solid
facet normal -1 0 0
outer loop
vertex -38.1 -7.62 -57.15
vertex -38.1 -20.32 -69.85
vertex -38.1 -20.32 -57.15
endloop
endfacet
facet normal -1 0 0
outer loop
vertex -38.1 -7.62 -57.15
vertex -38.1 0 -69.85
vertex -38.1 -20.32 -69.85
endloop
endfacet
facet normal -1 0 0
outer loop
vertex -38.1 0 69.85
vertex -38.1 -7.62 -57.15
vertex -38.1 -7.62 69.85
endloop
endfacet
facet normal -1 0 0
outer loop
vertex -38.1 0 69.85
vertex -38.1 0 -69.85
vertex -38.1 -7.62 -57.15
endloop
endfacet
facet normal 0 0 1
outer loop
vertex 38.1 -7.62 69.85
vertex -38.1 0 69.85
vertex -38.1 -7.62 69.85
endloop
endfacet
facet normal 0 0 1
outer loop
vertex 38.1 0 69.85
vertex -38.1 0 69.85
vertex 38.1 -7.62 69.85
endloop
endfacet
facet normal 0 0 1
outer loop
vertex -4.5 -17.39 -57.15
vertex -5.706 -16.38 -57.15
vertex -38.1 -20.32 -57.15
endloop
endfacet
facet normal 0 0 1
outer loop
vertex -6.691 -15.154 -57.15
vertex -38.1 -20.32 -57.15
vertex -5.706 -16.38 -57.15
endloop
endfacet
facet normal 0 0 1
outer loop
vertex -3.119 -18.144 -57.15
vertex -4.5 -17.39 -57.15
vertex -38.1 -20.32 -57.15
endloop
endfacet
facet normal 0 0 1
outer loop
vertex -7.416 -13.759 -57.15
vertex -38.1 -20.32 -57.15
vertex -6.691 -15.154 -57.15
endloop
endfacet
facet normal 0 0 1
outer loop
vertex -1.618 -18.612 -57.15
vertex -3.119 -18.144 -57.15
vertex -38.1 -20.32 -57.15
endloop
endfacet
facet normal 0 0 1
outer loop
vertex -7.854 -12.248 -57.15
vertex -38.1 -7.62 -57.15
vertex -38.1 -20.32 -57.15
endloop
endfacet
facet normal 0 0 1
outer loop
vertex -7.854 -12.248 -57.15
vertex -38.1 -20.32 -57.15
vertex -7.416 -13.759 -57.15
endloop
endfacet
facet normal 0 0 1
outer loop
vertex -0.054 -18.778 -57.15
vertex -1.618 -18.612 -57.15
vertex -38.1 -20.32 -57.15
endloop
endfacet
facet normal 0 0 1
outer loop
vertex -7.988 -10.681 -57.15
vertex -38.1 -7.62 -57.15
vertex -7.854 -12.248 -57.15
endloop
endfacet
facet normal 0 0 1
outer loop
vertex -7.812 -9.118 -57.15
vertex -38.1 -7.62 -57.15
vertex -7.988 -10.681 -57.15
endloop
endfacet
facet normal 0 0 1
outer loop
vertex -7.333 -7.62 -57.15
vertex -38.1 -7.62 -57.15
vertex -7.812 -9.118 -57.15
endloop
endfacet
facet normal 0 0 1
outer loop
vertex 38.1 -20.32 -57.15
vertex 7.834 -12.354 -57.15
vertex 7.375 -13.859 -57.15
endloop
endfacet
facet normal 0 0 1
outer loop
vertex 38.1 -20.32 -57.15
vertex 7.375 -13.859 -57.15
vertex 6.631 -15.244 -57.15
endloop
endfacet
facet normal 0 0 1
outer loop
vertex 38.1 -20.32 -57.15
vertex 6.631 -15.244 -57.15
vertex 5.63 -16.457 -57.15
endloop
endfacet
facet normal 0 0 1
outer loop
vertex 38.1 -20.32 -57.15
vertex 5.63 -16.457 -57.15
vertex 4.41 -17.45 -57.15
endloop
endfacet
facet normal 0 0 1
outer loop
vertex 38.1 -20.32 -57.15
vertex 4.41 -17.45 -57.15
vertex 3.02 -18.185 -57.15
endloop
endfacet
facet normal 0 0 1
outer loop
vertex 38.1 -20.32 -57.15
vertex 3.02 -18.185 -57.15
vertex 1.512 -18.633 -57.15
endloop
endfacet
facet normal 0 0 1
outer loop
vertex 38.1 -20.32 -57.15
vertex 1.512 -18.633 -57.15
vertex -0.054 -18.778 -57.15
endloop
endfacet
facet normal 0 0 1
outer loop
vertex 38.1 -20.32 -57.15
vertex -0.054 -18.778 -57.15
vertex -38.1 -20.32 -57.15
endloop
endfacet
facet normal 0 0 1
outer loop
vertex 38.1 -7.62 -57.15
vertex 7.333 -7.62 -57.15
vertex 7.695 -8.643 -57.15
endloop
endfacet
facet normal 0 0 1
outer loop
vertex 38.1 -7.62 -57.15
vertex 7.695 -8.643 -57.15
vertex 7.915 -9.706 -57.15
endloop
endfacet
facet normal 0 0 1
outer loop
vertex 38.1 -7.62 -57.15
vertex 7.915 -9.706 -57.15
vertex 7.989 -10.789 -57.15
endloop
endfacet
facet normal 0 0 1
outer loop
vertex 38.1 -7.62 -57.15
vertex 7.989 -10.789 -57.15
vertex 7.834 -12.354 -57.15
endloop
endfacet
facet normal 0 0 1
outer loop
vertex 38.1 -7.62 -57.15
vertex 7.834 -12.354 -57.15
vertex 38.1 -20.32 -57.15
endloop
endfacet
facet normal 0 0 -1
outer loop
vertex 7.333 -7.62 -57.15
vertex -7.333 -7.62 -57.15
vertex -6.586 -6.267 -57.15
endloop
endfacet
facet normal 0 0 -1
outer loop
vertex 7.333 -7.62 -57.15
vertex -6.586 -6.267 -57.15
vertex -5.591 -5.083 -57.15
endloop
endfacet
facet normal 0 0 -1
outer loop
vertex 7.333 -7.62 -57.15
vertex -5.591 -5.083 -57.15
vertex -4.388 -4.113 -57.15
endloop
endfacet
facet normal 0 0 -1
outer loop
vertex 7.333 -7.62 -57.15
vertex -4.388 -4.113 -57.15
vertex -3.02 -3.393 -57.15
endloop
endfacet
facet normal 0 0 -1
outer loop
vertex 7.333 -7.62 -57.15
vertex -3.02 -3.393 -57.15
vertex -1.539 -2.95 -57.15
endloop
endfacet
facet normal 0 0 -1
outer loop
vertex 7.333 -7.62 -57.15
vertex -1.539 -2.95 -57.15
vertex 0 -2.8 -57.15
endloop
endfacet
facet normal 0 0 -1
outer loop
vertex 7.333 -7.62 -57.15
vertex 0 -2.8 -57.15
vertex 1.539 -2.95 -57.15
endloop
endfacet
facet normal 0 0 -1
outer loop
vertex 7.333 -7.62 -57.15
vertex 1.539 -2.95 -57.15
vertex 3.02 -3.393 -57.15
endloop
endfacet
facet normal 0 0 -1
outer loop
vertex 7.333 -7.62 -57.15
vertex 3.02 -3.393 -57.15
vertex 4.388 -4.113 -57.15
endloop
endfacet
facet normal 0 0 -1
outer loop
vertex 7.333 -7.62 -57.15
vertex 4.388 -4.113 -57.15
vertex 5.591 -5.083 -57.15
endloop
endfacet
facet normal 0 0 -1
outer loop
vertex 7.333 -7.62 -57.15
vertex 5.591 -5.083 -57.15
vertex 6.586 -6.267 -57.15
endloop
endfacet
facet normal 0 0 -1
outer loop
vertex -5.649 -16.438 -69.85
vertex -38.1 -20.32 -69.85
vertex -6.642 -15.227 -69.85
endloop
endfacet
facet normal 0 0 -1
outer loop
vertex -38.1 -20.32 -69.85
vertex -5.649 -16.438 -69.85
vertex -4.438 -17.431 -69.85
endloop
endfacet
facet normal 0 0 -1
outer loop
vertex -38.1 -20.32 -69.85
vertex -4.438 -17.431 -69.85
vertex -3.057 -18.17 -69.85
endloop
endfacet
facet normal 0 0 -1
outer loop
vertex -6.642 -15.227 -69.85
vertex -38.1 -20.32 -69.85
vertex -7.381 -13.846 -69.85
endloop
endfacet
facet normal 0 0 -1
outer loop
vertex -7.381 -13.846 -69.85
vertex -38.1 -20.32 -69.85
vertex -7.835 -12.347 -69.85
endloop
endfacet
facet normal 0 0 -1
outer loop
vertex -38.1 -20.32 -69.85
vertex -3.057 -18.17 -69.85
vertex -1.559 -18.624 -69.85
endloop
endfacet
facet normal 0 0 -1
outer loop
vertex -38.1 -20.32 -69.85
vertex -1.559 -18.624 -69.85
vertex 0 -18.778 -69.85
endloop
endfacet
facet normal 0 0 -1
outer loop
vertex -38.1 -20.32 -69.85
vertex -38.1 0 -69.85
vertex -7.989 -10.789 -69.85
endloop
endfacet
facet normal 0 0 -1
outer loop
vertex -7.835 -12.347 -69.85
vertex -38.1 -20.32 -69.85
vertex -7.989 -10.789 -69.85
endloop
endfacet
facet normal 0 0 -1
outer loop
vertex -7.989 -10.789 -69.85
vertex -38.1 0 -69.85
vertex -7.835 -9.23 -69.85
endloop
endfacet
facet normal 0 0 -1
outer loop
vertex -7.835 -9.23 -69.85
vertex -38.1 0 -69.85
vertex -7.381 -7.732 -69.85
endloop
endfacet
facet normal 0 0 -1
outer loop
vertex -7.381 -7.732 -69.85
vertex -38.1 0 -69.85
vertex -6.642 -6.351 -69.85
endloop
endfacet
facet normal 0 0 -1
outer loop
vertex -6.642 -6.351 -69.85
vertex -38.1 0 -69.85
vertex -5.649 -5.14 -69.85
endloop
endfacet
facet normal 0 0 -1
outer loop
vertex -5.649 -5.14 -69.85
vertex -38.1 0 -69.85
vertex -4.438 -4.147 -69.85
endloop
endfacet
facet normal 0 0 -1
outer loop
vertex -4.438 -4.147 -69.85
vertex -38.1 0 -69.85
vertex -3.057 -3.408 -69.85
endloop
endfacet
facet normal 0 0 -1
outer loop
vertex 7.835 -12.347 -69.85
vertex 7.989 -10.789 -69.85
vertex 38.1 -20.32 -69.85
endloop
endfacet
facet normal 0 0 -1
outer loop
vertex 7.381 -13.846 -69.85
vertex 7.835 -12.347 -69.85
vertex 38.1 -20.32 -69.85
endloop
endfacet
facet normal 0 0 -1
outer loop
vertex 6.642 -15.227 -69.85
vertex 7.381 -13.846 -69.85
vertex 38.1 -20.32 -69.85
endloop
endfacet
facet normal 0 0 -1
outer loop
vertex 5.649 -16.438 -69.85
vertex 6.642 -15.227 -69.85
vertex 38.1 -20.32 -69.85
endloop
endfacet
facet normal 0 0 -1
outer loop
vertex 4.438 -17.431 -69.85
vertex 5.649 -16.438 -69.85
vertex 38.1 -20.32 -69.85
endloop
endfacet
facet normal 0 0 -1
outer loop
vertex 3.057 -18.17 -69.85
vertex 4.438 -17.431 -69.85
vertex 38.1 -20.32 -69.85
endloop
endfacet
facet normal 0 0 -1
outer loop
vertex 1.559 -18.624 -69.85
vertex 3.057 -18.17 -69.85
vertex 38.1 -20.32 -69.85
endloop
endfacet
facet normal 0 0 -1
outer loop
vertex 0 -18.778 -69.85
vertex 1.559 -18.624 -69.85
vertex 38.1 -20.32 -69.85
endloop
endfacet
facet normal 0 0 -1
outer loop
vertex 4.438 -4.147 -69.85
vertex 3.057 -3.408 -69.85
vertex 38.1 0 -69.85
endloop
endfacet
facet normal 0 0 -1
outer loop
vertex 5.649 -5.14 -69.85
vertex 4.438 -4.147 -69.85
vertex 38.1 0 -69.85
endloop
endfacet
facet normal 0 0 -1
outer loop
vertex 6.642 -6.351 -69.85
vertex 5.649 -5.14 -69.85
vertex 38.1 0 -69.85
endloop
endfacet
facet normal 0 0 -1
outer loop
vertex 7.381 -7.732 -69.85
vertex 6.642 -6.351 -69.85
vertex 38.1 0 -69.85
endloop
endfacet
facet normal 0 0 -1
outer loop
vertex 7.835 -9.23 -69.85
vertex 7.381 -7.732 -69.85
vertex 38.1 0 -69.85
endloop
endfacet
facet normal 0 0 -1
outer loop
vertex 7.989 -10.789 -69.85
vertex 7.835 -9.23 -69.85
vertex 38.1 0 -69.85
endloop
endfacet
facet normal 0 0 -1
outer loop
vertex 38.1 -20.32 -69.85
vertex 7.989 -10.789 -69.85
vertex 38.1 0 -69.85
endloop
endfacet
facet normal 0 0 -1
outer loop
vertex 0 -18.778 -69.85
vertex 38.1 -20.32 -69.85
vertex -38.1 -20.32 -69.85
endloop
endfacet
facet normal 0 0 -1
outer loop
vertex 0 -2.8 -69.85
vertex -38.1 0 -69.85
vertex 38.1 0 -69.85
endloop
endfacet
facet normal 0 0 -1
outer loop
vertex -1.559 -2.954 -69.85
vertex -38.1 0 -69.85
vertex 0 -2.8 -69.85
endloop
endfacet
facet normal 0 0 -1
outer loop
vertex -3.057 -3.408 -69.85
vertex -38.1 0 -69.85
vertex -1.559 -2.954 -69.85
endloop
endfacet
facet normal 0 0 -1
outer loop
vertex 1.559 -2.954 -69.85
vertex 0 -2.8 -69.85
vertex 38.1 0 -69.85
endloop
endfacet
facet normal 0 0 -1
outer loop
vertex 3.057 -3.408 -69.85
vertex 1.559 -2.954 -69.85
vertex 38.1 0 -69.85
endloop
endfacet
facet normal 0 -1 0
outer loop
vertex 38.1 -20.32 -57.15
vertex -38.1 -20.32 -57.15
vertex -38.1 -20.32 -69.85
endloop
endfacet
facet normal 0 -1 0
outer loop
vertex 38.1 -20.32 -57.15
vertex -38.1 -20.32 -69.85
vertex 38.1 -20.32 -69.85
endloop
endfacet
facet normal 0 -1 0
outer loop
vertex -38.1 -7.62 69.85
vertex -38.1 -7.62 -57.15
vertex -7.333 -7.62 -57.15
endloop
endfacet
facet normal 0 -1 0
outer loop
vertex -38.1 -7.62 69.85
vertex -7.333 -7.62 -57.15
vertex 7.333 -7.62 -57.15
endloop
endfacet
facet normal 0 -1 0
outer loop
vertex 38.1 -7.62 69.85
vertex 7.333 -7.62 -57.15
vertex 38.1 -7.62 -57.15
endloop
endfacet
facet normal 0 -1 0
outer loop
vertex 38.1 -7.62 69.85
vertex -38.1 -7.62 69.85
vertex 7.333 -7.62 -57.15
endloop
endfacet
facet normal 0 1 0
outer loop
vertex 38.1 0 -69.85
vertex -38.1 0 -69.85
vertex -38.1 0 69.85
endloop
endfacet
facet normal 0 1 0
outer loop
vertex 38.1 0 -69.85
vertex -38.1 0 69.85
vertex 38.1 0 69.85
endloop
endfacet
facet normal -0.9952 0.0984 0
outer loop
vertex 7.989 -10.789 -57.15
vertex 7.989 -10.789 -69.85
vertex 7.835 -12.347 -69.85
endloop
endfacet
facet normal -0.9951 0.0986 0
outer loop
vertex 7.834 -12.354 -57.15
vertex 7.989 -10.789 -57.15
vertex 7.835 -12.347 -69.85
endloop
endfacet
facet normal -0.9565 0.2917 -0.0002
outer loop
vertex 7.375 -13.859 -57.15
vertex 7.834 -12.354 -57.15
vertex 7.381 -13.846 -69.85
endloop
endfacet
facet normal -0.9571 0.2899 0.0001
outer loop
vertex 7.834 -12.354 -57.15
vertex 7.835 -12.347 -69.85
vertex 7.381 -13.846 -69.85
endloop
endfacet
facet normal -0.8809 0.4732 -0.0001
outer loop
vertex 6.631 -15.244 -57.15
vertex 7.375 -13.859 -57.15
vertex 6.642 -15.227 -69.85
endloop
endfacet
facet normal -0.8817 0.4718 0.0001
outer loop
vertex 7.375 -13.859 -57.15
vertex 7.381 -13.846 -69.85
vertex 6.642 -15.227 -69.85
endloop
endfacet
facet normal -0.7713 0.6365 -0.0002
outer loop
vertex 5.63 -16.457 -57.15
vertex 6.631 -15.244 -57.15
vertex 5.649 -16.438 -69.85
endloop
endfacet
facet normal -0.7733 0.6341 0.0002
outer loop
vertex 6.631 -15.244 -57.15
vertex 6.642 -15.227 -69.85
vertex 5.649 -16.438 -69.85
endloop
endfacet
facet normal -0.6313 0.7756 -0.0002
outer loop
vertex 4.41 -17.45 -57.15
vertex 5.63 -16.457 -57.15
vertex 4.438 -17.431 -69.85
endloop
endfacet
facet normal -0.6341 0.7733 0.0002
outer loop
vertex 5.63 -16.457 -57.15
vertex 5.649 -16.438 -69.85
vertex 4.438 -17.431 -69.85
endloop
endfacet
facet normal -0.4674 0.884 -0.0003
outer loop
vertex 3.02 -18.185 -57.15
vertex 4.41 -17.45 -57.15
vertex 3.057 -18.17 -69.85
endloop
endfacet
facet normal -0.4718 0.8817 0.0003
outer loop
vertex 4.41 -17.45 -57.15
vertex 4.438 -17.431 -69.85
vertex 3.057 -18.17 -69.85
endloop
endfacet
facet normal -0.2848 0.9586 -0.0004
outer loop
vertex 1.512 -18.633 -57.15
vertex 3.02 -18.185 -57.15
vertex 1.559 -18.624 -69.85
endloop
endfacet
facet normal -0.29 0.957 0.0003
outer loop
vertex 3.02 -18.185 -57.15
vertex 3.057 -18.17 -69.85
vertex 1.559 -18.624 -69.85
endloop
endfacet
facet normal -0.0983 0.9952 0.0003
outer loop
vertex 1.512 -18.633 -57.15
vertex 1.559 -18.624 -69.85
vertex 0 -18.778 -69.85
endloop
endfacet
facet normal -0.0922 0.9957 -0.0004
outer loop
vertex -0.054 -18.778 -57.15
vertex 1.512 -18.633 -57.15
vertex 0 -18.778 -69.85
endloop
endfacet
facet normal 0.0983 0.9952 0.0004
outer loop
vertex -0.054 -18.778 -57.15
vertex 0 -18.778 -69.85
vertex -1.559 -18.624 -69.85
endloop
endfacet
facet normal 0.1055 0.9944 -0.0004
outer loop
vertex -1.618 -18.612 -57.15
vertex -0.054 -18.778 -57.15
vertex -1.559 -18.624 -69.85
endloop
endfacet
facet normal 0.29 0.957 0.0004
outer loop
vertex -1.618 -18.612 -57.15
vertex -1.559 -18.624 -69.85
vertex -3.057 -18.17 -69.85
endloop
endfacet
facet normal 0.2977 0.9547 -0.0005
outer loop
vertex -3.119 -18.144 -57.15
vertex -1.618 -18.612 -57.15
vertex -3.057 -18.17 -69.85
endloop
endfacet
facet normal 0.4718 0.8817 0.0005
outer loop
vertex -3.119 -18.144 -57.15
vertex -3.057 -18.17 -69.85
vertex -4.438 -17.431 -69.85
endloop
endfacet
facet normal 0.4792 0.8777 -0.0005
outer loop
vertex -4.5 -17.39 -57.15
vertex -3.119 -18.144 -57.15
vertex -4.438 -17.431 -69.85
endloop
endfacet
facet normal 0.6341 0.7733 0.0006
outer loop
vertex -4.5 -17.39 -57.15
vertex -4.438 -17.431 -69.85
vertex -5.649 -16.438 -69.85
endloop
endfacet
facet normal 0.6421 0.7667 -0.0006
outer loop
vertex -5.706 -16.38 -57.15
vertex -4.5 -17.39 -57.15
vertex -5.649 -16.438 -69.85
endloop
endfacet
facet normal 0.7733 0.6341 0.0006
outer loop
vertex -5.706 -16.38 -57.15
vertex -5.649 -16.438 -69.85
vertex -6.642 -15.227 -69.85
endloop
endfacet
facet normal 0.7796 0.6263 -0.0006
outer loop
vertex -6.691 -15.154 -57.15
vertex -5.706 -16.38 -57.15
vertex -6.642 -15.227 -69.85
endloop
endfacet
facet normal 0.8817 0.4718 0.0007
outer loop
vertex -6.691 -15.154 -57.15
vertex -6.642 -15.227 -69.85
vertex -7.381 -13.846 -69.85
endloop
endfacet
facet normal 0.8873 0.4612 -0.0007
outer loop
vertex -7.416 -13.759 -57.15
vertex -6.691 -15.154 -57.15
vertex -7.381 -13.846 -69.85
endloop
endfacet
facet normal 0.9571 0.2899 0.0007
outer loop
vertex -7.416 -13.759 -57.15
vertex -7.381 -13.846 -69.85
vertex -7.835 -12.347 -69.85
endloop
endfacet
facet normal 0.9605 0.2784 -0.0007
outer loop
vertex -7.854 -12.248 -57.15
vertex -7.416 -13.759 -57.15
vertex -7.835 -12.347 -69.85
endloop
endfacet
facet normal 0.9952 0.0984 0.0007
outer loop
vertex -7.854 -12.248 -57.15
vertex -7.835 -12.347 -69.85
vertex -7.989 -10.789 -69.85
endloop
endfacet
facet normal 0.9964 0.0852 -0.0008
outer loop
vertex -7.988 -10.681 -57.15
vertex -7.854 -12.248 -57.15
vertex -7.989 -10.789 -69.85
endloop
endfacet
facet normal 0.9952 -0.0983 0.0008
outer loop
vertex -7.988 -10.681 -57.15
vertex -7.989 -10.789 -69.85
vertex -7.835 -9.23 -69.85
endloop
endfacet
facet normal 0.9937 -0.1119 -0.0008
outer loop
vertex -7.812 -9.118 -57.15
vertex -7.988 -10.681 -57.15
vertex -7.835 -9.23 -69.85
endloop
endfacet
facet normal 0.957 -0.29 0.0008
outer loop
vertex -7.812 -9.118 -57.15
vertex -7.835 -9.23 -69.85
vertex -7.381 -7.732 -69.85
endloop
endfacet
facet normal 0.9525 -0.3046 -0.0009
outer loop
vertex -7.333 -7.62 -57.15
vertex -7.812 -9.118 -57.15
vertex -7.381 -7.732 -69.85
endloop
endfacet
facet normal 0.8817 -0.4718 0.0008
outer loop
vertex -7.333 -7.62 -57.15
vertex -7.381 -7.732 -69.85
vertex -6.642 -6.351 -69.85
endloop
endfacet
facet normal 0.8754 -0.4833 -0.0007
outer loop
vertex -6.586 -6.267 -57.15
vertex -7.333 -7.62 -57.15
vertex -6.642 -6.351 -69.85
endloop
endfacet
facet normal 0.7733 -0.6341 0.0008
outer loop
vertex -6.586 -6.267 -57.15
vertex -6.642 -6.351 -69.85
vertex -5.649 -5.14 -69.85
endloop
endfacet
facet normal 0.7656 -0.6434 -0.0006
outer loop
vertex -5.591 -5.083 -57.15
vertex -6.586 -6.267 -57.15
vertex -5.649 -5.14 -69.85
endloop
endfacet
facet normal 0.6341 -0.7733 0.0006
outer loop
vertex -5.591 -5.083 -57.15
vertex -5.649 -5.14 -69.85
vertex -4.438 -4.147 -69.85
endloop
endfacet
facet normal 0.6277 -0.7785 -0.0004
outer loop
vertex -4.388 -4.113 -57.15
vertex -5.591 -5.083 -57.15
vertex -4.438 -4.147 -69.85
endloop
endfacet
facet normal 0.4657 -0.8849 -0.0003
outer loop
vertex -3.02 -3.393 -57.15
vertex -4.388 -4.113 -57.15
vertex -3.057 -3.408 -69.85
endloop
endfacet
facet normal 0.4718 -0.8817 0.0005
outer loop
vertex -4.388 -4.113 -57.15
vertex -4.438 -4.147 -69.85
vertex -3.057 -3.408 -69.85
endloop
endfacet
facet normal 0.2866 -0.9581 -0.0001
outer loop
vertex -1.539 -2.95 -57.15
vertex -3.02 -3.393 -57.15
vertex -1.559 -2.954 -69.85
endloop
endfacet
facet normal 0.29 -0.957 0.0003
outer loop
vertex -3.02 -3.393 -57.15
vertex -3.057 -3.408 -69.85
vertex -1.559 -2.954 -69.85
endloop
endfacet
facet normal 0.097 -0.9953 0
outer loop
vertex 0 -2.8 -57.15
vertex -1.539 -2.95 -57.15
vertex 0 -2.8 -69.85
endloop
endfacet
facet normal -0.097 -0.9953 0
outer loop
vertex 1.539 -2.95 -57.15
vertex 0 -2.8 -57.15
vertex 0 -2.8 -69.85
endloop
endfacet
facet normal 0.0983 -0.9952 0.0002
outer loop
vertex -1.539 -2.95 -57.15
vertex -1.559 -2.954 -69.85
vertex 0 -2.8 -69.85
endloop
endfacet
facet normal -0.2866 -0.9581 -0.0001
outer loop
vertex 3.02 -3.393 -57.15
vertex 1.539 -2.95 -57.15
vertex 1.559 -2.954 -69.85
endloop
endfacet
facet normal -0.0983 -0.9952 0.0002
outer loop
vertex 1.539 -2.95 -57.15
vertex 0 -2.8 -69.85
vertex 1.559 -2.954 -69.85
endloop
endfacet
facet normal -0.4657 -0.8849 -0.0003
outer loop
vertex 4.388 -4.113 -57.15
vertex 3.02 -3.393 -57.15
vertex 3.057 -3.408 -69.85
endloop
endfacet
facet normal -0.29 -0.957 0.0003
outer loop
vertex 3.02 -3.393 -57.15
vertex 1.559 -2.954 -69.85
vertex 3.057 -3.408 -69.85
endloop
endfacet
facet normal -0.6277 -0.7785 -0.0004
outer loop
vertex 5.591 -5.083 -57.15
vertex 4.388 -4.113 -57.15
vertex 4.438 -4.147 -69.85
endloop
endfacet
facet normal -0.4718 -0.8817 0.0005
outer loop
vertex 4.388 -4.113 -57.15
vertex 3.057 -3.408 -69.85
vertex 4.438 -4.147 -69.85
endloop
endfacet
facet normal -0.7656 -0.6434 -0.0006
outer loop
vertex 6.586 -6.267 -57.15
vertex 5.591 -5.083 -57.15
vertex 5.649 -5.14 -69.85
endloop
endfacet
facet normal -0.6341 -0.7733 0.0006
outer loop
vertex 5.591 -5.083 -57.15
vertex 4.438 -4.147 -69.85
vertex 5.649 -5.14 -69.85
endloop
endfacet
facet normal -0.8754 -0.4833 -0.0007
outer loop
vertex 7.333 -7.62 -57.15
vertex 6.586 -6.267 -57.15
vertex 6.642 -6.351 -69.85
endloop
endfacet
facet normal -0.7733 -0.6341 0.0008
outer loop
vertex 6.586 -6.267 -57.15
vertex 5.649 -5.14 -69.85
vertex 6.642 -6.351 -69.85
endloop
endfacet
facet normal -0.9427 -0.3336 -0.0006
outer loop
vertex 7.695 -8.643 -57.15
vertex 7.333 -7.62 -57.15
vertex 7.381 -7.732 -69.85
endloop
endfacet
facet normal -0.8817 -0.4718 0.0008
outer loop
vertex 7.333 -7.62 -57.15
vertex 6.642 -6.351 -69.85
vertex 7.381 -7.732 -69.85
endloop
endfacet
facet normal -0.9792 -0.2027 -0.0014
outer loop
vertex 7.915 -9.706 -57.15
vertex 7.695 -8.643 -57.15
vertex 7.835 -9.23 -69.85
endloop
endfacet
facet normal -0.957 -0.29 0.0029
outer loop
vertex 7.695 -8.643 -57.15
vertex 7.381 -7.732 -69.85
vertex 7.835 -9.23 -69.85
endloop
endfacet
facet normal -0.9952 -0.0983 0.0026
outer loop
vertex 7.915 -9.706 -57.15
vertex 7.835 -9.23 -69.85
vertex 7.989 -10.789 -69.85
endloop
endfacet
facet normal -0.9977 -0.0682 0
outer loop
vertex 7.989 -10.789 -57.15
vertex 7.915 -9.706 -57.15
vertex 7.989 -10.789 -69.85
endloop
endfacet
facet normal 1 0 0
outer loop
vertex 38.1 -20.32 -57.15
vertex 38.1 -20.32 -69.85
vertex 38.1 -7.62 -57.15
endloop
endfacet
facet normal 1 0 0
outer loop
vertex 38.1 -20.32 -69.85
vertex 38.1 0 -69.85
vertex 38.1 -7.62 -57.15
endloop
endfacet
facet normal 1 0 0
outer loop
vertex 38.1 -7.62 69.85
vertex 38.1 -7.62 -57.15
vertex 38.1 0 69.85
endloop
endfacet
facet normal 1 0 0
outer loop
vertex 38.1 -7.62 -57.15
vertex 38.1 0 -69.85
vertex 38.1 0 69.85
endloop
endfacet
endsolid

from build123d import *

# Parameters (mm, degrees)
F0_W     = 76.2
F0_H     = 139.7
F1_DEPTH = 7.62
F2_W     = 76.2
F2_H     = 12.7
F3_DEPTH = 12.7
F4_R     = 7.988777
F5_DEPTH = 12.7


with BuildPart() as f1:
    # F0 (on Front) → F1 (new body)
    with BuildSketch(Plane.XZ):
        Rectangle(F0_W, F0_H)
    extrude(amount=F1_DEPTH)

    # F2 (on face) → F3 (join)
    with BuildSketch(Plane.XZ.offset(7.62)):
        with Locations((0, -63.5)):
            Rectangle(F2_W, F2_H)
    extrude(amount=F3_DEPTH)

    # F4 (on face) → F5 (cut)
    with BuildSketch(Plane(origin=(0, 0, -69.85), x_dir=(1, 0, 0), z_dir=(0, 0, -1))):
        with Locations((0, 10.788938)):
            Circle(F4_R)
    extrude(amount=-F5_DEPTH, mode=Mode.SUBTRACT)


solid = f1.part
